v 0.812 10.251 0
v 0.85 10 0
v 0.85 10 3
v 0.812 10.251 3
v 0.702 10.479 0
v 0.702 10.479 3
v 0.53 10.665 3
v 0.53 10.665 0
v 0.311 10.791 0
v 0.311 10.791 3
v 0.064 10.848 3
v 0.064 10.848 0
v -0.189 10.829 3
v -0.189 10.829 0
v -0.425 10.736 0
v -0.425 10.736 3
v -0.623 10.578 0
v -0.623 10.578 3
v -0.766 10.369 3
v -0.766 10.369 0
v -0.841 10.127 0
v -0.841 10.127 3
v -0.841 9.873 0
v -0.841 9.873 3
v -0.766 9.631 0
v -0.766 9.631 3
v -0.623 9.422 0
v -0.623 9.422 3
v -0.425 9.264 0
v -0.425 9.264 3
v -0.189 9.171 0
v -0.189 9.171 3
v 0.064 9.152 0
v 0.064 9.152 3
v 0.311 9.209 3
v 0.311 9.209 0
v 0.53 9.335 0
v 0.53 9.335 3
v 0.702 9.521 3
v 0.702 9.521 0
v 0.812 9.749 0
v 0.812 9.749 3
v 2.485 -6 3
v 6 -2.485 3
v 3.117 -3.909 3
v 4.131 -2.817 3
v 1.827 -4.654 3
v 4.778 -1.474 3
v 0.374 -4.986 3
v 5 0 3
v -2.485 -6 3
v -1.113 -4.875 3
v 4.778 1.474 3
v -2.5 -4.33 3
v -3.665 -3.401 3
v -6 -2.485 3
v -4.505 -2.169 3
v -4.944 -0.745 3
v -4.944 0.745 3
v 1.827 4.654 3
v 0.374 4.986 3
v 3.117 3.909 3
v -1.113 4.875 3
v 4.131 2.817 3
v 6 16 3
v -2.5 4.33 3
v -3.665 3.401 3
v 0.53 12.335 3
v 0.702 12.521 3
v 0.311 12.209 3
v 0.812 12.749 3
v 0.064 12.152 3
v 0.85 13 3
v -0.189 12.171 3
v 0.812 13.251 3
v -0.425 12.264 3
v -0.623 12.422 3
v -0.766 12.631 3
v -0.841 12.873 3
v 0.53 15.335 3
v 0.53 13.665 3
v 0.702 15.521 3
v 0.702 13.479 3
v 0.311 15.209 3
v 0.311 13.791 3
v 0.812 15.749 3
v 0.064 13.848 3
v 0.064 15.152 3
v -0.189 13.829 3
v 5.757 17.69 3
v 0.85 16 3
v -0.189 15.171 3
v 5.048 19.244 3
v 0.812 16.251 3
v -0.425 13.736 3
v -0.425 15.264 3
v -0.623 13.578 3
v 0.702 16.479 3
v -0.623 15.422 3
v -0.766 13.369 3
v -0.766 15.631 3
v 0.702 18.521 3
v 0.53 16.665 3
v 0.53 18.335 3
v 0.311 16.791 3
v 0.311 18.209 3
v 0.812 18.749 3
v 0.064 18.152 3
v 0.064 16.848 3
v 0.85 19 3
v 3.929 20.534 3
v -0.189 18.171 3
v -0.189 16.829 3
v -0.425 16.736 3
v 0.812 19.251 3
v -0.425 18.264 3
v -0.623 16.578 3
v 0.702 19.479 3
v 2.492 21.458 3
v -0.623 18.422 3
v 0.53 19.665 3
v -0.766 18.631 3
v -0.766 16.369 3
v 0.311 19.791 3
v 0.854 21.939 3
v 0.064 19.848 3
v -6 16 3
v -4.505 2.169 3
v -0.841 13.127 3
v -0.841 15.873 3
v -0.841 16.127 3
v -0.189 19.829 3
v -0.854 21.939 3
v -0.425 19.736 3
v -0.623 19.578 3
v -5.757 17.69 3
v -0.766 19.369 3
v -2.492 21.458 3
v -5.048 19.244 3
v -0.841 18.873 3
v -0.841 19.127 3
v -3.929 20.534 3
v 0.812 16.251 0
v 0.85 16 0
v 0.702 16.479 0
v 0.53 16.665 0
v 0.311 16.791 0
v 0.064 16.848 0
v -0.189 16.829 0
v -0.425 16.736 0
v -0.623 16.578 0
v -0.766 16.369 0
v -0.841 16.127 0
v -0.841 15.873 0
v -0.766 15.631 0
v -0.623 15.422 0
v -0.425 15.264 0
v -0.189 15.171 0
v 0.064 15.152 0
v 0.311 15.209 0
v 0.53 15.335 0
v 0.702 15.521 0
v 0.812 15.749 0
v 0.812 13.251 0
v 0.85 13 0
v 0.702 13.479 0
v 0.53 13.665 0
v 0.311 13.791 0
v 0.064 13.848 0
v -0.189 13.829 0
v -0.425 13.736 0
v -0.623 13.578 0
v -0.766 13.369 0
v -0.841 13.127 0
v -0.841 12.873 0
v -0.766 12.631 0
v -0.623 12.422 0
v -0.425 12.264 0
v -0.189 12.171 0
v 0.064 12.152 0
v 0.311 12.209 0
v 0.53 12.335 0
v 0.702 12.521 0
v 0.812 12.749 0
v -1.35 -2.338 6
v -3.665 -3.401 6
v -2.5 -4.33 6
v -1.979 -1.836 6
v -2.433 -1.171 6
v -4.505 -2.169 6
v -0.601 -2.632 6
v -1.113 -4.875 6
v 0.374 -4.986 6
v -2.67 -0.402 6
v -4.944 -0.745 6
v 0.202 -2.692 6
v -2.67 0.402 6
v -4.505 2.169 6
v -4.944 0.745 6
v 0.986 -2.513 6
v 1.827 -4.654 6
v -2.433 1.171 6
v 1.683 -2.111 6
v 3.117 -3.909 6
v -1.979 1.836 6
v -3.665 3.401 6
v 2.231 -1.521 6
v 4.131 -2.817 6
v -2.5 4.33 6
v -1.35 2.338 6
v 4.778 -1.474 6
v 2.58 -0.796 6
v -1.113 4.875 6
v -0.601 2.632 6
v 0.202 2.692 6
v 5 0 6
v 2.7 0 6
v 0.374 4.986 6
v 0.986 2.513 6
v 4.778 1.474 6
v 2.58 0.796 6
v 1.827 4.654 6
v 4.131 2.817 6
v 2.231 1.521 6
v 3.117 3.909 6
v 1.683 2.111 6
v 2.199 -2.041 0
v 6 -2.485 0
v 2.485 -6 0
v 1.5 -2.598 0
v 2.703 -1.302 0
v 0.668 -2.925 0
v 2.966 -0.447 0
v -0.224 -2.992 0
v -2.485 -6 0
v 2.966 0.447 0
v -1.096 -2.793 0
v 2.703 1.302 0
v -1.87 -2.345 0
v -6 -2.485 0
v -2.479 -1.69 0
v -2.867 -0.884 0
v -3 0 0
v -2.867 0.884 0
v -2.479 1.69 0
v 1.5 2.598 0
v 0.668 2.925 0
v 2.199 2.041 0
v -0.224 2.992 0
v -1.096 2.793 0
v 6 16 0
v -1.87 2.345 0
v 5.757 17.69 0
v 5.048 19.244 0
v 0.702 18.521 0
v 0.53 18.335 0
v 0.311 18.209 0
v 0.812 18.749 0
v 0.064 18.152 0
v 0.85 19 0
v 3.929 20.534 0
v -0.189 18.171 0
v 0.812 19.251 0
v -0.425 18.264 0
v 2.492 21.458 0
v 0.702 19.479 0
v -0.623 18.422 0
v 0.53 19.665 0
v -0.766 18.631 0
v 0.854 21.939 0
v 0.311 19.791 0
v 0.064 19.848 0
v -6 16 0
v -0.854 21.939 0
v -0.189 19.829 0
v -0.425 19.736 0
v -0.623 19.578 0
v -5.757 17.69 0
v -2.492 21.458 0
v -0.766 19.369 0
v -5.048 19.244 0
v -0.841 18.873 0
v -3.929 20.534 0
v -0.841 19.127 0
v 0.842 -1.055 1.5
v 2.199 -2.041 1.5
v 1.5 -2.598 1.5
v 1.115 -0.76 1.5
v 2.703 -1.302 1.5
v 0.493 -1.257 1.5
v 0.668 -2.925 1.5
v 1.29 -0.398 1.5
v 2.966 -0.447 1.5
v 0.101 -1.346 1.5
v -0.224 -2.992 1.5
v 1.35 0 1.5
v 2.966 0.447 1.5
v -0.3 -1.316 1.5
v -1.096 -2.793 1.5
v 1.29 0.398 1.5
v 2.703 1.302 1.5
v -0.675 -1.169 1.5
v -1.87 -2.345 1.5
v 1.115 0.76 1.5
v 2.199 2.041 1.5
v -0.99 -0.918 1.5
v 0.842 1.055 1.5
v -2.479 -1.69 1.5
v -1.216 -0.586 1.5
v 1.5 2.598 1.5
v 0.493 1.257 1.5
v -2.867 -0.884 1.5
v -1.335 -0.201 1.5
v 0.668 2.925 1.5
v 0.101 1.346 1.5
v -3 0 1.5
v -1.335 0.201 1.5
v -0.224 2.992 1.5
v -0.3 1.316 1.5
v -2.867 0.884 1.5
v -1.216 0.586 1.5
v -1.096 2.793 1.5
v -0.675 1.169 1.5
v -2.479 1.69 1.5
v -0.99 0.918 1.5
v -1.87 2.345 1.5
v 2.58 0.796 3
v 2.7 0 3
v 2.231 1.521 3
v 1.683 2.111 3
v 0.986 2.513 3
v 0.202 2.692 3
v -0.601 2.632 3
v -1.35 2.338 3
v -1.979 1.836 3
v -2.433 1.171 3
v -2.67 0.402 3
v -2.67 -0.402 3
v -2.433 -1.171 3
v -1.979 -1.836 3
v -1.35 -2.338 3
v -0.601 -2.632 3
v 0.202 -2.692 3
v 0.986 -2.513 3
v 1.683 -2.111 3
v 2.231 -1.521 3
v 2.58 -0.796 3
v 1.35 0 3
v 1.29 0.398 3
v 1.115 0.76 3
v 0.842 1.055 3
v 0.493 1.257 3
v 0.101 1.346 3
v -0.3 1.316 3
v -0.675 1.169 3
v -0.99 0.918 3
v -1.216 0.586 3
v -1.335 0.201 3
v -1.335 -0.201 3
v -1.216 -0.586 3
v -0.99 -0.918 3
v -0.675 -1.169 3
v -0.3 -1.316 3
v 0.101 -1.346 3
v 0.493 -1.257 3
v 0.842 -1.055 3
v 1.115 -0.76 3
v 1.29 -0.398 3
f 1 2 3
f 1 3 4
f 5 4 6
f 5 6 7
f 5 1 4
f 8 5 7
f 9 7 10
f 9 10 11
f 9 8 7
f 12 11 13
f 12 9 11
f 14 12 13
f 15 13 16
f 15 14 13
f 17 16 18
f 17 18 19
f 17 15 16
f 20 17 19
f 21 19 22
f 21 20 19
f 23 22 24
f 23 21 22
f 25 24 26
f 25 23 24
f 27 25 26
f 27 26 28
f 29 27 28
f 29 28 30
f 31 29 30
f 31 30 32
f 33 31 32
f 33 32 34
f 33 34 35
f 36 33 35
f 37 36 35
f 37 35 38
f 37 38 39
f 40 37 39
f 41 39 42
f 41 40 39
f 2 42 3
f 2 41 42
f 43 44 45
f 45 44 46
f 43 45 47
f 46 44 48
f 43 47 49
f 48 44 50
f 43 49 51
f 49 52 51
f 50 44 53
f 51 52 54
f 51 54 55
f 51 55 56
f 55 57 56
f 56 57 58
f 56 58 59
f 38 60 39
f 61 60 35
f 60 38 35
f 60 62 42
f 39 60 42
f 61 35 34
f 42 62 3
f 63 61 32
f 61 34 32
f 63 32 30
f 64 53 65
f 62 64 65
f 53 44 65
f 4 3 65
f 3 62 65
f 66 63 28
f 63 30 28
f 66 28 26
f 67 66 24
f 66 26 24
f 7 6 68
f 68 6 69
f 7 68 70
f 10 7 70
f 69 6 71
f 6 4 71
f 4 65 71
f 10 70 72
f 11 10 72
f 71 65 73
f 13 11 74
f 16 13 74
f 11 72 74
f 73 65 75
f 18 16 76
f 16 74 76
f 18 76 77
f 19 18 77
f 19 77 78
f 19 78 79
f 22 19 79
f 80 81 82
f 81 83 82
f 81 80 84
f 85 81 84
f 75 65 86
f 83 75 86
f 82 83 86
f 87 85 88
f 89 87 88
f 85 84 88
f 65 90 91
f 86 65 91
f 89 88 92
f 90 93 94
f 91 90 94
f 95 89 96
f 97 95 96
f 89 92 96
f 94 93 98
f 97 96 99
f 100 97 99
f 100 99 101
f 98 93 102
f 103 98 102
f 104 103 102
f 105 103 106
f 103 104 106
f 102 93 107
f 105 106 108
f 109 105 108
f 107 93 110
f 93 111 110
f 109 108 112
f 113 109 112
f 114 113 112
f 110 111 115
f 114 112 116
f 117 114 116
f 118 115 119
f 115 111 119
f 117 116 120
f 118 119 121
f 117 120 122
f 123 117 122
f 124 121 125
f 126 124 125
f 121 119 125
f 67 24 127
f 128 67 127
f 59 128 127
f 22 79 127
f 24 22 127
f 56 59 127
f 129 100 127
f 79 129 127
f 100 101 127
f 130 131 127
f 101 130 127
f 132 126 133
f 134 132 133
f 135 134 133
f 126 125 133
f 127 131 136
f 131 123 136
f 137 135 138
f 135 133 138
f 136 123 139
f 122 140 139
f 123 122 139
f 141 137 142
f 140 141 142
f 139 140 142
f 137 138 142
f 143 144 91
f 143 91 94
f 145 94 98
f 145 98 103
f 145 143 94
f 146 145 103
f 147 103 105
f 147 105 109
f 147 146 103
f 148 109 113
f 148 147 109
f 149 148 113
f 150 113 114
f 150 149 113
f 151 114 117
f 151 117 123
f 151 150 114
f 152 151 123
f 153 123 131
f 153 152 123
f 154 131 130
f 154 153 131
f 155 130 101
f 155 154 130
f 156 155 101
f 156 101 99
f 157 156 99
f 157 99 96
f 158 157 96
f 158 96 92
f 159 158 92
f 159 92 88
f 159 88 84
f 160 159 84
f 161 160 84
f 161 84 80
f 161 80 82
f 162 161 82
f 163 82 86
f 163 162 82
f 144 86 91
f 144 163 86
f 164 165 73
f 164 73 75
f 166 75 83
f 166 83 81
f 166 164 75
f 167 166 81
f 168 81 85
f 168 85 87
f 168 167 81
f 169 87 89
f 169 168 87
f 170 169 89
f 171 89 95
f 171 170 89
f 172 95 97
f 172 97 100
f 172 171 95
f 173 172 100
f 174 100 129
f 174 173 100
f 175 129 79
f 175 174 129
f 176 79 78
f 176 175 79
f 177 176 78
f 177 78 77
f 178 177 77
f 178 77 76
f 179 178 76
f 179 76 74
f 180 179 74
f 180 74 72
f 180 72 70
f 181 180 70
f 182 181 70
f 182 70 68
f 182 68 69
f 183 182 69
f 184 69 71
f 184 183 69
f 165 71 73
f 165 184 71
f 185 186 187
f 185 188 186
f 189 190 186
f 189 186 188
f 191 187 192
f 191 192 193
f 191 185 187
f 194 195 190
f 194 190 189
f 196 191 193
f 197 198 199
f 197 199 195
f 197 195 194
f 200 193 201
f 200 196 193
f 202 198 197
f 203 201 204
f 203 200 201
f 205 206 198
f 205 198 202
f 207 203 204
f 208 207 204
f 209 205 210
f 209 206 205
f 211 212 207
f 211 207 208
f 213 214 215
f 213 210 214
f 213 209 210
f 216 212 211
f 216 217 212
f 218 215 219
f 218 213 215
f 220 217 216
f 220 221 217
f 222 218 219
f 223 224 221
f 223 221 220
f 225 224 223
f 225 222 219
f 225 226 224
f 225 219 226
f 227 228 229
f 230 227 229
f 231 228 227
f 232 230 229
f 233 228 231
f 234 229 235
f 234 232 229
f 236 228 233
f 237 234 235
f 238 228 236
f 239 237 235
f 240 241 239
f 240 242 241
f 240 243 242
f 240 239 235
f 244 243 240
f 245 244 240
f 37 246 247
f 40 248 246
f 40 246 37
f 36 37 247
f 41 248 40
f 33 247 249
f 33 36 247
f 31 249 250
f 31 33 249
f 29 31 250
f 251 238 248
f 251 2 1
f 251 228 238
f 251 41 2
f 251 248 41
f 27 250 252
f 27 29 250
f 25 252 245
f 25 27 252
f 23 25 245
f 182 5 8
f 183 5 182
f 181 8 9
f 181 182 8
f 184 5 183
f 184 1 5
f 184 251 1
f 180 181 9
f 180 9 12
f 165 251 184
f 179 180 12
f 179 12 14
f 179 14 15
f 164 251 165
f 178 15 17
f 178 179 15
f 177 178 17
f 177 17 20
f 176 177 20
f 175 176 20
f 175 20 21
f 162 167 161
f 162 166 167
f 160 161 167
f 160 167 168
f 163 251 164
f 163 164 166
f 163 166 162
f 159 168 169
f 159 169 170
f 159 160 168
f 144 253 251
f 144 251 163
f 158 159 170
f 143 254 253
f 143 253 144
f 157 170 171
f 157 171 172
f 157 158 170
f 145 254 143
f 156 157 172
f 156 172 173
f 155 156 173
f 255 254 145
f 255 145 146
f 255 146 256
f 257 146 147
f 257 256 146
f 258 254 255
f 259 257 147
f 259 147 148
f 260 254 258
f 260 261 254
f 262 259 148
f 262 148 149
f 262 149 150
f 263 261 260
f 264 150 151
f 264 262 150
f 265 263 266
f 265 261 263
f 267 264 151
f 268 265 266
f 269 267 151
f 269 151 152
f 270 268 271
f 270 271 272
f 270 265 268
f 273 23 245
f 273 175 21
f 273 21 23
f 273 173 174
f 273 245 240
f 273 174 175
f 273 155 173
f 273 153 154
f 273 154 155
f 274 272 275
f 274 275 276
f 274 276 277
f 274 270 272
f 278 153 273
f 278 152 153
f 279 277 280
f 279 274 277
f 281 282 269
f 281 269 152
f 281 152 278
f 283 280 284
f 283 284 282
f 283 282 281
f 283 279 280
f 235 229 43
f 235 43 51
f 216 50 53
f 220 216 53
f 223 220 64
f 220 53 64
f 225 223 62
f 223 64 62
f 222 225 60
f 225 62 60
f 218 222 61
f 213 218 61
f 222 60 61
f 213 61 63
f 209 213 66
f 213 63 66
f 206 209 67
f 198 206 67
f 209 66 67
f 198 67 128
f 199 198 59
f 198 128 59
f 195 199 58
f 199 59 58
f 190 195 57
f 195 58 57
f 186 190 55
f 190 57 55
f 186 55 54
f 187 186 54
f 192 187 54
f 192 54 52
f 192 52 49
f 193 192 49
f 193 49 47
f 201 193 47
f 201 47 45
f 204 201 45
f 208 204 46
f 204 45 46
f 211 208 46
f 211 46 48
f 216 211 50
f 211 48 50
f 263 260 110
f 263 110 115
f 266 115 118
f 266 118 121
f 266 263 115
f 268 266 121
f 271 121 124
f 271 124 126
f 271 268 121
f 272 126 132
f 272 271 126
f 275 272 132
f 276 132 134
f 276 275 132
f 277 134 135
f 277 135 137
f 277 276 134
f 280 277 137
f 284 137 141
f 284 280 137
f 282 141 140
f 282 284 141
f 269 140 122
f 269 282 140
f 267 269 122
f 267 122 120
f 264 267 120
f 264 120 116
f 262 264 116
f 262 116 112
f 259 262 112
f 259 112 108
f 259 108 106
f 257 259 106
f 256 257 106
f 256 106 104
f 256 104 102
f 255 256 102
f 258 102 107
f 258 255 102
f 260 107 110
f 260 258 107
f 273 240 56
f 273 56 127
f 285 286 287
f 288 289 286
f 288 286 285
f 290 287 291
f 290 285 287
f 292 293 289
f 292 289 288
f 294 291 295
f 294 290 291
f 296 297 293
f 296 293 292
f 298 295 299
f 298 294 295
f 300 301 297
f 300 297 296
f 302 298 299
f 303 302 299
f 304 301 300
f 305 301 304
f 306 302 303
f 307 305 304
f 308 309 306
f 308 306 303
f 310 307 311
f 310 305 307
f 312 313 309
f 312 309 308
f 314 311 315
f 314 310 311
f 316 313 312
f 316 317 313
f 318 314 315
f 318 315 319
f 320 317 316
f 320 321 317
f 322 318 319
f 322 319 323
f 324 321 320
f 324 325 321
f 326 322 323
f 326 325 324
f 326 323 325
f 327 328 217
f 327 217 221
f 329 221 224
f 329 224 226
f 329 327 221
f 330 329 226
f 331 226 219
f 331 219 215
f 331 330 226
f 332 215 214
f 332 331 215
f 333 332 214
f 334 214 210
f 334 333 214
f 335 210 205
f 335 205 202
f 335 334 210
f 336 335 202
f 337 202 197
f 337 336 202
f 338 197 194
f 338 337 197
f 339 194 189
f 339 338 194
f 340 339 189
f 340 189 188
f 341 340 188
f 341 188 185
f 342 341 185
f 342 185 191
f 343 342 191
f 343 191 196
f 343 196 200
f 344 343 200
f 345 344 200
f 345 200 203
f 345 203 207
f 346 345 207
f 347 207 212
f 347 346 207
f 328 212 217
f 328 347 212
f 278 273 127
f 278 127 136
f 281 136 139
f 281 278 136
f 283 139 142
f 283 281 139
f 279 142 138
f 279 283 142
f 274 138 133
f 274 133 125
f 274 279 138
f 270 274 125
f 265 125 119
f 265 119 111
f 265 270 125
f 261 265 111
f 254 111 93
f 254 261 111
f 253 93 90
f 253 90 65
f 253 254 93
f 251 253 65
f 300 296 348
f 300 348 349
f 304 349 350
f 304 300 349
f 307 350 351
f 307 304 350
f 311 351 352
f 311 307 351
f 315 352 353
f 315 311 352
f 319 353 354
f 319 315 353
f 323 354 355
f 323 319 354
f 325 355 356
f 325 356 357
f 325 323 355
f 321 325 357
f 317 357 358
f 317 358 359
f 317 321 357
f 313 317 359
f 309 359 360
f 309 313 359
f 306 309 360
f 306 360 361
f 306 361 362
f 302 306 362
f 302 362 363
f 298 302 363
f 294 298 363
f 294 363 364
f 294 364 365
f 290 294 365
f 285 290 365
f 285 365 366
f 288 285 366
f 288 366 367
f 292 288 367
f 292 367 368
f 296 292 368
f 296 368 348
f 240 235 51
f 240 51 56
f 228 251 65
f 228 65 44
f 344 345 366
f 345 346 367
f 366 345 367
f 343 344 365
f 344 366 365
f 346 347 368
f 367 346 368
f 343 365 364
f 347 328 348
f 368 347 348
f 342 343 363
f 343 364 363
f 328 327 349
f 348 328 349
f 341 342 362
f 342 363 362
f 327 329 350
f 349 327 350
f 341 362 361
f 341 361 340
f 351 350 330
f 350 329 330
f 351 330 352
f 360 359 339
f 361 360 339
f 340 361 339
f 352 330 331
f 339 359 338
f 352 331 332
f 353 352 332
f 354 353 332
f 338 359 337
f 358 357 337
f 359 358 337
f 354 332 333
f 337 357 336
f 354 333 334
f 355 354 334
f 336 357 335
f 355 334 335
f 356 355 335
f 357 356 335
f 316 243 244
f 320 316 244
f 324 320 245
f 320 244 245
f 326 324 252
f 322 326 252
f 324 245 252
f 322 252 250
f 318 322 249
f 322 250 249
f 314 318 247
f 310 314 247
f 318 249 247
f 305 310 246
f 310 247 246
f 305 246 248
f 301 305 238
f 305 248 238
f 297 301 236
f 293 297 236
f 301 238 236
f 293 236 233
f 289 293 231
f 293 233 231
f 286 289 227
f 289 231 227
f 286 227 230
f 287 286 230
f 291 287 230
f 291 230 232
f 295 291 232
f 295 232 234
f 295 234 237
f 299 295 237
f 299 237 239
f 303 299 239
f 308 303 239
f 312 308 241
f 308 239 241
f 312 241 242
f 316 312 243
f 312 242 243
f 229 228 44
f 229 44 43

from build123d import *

# Parameters (mm, degrees)
SKETCH_1_R          = 1.35
SKETCH_1_R_2        = 0.85
EXTRUDE_1_DEPTH     = 3
SKETCH_2_R          = 5
SKETCH_2_R_2        = 2.7
EXTRUDE_2_DEPTH     = 3
SKETCH_3_R          = 3
CUT_EXTRUDE_1_DEPTH = 1.5


with BuildPart() as part:
    # Эскиз1 → Бобышка-Вытянуть1 (new body)
    with BuildSketch(Plane.XY):
        with BuildLine():
            Line((6, 16), (6, -2.485281374))
            Line((6, -2.485281374), (2.485281374, -6))
            Line((2.485281374, -6), (-2.485281374, -6))
            Line((-2.485281374, -6), (-6, -2.485281374))
            Line((-6, -2.485281374), (-6, 16))
            ThreePointArc((-6, 16), (0, 22), (6, 16))
        make_face()
        Circle(SKETCH_1_R, mode=Mode.SUBTRACT)
        with Locations((0, 10)):
            Circle(SKETCH_1_R_2, mode=Mode.SUBTRACT)
        with Locations((0, 13)):
            Circle(SKETCH_1_R_2, mode=Mode.SUBTRACT)
        with Locations((0, 16)):
            Circle(SKETCH_1_R_2, mode=Mode.SUBTRACT)
        with Locations((0, 19)):
            Circle(SKETCH_1_R_2, mode=Mode.SUBTRACT)
    extrude(amount=EXTRUDE_1_DEPTH)

    # Эскиз2 → Бобышка-Вытянуть2 (add)
    with BuildSketch(Plane.XY.offset(3)):
        Circle(SKETCH_2_R)
        Circle(SKETCH_2_R_2, mode=Mode.SUBTRACT)
    extrude(amount=EXTRUDE_2_DEPTH)

    # Эскиз3 → Вырез-Вытянуть1 (cut)
    with BuildSketch(Plane(origin=(0, 0, 0), x_dir=(-1, 0, 0), z_dir=(0, 0, -1))):
        Circle(SKETCH_3_R)
    extrude(amount=-CUT_EXTRUDE_1_DEPTH, mode=Mode.SUBTRACT)


solid = part.part
